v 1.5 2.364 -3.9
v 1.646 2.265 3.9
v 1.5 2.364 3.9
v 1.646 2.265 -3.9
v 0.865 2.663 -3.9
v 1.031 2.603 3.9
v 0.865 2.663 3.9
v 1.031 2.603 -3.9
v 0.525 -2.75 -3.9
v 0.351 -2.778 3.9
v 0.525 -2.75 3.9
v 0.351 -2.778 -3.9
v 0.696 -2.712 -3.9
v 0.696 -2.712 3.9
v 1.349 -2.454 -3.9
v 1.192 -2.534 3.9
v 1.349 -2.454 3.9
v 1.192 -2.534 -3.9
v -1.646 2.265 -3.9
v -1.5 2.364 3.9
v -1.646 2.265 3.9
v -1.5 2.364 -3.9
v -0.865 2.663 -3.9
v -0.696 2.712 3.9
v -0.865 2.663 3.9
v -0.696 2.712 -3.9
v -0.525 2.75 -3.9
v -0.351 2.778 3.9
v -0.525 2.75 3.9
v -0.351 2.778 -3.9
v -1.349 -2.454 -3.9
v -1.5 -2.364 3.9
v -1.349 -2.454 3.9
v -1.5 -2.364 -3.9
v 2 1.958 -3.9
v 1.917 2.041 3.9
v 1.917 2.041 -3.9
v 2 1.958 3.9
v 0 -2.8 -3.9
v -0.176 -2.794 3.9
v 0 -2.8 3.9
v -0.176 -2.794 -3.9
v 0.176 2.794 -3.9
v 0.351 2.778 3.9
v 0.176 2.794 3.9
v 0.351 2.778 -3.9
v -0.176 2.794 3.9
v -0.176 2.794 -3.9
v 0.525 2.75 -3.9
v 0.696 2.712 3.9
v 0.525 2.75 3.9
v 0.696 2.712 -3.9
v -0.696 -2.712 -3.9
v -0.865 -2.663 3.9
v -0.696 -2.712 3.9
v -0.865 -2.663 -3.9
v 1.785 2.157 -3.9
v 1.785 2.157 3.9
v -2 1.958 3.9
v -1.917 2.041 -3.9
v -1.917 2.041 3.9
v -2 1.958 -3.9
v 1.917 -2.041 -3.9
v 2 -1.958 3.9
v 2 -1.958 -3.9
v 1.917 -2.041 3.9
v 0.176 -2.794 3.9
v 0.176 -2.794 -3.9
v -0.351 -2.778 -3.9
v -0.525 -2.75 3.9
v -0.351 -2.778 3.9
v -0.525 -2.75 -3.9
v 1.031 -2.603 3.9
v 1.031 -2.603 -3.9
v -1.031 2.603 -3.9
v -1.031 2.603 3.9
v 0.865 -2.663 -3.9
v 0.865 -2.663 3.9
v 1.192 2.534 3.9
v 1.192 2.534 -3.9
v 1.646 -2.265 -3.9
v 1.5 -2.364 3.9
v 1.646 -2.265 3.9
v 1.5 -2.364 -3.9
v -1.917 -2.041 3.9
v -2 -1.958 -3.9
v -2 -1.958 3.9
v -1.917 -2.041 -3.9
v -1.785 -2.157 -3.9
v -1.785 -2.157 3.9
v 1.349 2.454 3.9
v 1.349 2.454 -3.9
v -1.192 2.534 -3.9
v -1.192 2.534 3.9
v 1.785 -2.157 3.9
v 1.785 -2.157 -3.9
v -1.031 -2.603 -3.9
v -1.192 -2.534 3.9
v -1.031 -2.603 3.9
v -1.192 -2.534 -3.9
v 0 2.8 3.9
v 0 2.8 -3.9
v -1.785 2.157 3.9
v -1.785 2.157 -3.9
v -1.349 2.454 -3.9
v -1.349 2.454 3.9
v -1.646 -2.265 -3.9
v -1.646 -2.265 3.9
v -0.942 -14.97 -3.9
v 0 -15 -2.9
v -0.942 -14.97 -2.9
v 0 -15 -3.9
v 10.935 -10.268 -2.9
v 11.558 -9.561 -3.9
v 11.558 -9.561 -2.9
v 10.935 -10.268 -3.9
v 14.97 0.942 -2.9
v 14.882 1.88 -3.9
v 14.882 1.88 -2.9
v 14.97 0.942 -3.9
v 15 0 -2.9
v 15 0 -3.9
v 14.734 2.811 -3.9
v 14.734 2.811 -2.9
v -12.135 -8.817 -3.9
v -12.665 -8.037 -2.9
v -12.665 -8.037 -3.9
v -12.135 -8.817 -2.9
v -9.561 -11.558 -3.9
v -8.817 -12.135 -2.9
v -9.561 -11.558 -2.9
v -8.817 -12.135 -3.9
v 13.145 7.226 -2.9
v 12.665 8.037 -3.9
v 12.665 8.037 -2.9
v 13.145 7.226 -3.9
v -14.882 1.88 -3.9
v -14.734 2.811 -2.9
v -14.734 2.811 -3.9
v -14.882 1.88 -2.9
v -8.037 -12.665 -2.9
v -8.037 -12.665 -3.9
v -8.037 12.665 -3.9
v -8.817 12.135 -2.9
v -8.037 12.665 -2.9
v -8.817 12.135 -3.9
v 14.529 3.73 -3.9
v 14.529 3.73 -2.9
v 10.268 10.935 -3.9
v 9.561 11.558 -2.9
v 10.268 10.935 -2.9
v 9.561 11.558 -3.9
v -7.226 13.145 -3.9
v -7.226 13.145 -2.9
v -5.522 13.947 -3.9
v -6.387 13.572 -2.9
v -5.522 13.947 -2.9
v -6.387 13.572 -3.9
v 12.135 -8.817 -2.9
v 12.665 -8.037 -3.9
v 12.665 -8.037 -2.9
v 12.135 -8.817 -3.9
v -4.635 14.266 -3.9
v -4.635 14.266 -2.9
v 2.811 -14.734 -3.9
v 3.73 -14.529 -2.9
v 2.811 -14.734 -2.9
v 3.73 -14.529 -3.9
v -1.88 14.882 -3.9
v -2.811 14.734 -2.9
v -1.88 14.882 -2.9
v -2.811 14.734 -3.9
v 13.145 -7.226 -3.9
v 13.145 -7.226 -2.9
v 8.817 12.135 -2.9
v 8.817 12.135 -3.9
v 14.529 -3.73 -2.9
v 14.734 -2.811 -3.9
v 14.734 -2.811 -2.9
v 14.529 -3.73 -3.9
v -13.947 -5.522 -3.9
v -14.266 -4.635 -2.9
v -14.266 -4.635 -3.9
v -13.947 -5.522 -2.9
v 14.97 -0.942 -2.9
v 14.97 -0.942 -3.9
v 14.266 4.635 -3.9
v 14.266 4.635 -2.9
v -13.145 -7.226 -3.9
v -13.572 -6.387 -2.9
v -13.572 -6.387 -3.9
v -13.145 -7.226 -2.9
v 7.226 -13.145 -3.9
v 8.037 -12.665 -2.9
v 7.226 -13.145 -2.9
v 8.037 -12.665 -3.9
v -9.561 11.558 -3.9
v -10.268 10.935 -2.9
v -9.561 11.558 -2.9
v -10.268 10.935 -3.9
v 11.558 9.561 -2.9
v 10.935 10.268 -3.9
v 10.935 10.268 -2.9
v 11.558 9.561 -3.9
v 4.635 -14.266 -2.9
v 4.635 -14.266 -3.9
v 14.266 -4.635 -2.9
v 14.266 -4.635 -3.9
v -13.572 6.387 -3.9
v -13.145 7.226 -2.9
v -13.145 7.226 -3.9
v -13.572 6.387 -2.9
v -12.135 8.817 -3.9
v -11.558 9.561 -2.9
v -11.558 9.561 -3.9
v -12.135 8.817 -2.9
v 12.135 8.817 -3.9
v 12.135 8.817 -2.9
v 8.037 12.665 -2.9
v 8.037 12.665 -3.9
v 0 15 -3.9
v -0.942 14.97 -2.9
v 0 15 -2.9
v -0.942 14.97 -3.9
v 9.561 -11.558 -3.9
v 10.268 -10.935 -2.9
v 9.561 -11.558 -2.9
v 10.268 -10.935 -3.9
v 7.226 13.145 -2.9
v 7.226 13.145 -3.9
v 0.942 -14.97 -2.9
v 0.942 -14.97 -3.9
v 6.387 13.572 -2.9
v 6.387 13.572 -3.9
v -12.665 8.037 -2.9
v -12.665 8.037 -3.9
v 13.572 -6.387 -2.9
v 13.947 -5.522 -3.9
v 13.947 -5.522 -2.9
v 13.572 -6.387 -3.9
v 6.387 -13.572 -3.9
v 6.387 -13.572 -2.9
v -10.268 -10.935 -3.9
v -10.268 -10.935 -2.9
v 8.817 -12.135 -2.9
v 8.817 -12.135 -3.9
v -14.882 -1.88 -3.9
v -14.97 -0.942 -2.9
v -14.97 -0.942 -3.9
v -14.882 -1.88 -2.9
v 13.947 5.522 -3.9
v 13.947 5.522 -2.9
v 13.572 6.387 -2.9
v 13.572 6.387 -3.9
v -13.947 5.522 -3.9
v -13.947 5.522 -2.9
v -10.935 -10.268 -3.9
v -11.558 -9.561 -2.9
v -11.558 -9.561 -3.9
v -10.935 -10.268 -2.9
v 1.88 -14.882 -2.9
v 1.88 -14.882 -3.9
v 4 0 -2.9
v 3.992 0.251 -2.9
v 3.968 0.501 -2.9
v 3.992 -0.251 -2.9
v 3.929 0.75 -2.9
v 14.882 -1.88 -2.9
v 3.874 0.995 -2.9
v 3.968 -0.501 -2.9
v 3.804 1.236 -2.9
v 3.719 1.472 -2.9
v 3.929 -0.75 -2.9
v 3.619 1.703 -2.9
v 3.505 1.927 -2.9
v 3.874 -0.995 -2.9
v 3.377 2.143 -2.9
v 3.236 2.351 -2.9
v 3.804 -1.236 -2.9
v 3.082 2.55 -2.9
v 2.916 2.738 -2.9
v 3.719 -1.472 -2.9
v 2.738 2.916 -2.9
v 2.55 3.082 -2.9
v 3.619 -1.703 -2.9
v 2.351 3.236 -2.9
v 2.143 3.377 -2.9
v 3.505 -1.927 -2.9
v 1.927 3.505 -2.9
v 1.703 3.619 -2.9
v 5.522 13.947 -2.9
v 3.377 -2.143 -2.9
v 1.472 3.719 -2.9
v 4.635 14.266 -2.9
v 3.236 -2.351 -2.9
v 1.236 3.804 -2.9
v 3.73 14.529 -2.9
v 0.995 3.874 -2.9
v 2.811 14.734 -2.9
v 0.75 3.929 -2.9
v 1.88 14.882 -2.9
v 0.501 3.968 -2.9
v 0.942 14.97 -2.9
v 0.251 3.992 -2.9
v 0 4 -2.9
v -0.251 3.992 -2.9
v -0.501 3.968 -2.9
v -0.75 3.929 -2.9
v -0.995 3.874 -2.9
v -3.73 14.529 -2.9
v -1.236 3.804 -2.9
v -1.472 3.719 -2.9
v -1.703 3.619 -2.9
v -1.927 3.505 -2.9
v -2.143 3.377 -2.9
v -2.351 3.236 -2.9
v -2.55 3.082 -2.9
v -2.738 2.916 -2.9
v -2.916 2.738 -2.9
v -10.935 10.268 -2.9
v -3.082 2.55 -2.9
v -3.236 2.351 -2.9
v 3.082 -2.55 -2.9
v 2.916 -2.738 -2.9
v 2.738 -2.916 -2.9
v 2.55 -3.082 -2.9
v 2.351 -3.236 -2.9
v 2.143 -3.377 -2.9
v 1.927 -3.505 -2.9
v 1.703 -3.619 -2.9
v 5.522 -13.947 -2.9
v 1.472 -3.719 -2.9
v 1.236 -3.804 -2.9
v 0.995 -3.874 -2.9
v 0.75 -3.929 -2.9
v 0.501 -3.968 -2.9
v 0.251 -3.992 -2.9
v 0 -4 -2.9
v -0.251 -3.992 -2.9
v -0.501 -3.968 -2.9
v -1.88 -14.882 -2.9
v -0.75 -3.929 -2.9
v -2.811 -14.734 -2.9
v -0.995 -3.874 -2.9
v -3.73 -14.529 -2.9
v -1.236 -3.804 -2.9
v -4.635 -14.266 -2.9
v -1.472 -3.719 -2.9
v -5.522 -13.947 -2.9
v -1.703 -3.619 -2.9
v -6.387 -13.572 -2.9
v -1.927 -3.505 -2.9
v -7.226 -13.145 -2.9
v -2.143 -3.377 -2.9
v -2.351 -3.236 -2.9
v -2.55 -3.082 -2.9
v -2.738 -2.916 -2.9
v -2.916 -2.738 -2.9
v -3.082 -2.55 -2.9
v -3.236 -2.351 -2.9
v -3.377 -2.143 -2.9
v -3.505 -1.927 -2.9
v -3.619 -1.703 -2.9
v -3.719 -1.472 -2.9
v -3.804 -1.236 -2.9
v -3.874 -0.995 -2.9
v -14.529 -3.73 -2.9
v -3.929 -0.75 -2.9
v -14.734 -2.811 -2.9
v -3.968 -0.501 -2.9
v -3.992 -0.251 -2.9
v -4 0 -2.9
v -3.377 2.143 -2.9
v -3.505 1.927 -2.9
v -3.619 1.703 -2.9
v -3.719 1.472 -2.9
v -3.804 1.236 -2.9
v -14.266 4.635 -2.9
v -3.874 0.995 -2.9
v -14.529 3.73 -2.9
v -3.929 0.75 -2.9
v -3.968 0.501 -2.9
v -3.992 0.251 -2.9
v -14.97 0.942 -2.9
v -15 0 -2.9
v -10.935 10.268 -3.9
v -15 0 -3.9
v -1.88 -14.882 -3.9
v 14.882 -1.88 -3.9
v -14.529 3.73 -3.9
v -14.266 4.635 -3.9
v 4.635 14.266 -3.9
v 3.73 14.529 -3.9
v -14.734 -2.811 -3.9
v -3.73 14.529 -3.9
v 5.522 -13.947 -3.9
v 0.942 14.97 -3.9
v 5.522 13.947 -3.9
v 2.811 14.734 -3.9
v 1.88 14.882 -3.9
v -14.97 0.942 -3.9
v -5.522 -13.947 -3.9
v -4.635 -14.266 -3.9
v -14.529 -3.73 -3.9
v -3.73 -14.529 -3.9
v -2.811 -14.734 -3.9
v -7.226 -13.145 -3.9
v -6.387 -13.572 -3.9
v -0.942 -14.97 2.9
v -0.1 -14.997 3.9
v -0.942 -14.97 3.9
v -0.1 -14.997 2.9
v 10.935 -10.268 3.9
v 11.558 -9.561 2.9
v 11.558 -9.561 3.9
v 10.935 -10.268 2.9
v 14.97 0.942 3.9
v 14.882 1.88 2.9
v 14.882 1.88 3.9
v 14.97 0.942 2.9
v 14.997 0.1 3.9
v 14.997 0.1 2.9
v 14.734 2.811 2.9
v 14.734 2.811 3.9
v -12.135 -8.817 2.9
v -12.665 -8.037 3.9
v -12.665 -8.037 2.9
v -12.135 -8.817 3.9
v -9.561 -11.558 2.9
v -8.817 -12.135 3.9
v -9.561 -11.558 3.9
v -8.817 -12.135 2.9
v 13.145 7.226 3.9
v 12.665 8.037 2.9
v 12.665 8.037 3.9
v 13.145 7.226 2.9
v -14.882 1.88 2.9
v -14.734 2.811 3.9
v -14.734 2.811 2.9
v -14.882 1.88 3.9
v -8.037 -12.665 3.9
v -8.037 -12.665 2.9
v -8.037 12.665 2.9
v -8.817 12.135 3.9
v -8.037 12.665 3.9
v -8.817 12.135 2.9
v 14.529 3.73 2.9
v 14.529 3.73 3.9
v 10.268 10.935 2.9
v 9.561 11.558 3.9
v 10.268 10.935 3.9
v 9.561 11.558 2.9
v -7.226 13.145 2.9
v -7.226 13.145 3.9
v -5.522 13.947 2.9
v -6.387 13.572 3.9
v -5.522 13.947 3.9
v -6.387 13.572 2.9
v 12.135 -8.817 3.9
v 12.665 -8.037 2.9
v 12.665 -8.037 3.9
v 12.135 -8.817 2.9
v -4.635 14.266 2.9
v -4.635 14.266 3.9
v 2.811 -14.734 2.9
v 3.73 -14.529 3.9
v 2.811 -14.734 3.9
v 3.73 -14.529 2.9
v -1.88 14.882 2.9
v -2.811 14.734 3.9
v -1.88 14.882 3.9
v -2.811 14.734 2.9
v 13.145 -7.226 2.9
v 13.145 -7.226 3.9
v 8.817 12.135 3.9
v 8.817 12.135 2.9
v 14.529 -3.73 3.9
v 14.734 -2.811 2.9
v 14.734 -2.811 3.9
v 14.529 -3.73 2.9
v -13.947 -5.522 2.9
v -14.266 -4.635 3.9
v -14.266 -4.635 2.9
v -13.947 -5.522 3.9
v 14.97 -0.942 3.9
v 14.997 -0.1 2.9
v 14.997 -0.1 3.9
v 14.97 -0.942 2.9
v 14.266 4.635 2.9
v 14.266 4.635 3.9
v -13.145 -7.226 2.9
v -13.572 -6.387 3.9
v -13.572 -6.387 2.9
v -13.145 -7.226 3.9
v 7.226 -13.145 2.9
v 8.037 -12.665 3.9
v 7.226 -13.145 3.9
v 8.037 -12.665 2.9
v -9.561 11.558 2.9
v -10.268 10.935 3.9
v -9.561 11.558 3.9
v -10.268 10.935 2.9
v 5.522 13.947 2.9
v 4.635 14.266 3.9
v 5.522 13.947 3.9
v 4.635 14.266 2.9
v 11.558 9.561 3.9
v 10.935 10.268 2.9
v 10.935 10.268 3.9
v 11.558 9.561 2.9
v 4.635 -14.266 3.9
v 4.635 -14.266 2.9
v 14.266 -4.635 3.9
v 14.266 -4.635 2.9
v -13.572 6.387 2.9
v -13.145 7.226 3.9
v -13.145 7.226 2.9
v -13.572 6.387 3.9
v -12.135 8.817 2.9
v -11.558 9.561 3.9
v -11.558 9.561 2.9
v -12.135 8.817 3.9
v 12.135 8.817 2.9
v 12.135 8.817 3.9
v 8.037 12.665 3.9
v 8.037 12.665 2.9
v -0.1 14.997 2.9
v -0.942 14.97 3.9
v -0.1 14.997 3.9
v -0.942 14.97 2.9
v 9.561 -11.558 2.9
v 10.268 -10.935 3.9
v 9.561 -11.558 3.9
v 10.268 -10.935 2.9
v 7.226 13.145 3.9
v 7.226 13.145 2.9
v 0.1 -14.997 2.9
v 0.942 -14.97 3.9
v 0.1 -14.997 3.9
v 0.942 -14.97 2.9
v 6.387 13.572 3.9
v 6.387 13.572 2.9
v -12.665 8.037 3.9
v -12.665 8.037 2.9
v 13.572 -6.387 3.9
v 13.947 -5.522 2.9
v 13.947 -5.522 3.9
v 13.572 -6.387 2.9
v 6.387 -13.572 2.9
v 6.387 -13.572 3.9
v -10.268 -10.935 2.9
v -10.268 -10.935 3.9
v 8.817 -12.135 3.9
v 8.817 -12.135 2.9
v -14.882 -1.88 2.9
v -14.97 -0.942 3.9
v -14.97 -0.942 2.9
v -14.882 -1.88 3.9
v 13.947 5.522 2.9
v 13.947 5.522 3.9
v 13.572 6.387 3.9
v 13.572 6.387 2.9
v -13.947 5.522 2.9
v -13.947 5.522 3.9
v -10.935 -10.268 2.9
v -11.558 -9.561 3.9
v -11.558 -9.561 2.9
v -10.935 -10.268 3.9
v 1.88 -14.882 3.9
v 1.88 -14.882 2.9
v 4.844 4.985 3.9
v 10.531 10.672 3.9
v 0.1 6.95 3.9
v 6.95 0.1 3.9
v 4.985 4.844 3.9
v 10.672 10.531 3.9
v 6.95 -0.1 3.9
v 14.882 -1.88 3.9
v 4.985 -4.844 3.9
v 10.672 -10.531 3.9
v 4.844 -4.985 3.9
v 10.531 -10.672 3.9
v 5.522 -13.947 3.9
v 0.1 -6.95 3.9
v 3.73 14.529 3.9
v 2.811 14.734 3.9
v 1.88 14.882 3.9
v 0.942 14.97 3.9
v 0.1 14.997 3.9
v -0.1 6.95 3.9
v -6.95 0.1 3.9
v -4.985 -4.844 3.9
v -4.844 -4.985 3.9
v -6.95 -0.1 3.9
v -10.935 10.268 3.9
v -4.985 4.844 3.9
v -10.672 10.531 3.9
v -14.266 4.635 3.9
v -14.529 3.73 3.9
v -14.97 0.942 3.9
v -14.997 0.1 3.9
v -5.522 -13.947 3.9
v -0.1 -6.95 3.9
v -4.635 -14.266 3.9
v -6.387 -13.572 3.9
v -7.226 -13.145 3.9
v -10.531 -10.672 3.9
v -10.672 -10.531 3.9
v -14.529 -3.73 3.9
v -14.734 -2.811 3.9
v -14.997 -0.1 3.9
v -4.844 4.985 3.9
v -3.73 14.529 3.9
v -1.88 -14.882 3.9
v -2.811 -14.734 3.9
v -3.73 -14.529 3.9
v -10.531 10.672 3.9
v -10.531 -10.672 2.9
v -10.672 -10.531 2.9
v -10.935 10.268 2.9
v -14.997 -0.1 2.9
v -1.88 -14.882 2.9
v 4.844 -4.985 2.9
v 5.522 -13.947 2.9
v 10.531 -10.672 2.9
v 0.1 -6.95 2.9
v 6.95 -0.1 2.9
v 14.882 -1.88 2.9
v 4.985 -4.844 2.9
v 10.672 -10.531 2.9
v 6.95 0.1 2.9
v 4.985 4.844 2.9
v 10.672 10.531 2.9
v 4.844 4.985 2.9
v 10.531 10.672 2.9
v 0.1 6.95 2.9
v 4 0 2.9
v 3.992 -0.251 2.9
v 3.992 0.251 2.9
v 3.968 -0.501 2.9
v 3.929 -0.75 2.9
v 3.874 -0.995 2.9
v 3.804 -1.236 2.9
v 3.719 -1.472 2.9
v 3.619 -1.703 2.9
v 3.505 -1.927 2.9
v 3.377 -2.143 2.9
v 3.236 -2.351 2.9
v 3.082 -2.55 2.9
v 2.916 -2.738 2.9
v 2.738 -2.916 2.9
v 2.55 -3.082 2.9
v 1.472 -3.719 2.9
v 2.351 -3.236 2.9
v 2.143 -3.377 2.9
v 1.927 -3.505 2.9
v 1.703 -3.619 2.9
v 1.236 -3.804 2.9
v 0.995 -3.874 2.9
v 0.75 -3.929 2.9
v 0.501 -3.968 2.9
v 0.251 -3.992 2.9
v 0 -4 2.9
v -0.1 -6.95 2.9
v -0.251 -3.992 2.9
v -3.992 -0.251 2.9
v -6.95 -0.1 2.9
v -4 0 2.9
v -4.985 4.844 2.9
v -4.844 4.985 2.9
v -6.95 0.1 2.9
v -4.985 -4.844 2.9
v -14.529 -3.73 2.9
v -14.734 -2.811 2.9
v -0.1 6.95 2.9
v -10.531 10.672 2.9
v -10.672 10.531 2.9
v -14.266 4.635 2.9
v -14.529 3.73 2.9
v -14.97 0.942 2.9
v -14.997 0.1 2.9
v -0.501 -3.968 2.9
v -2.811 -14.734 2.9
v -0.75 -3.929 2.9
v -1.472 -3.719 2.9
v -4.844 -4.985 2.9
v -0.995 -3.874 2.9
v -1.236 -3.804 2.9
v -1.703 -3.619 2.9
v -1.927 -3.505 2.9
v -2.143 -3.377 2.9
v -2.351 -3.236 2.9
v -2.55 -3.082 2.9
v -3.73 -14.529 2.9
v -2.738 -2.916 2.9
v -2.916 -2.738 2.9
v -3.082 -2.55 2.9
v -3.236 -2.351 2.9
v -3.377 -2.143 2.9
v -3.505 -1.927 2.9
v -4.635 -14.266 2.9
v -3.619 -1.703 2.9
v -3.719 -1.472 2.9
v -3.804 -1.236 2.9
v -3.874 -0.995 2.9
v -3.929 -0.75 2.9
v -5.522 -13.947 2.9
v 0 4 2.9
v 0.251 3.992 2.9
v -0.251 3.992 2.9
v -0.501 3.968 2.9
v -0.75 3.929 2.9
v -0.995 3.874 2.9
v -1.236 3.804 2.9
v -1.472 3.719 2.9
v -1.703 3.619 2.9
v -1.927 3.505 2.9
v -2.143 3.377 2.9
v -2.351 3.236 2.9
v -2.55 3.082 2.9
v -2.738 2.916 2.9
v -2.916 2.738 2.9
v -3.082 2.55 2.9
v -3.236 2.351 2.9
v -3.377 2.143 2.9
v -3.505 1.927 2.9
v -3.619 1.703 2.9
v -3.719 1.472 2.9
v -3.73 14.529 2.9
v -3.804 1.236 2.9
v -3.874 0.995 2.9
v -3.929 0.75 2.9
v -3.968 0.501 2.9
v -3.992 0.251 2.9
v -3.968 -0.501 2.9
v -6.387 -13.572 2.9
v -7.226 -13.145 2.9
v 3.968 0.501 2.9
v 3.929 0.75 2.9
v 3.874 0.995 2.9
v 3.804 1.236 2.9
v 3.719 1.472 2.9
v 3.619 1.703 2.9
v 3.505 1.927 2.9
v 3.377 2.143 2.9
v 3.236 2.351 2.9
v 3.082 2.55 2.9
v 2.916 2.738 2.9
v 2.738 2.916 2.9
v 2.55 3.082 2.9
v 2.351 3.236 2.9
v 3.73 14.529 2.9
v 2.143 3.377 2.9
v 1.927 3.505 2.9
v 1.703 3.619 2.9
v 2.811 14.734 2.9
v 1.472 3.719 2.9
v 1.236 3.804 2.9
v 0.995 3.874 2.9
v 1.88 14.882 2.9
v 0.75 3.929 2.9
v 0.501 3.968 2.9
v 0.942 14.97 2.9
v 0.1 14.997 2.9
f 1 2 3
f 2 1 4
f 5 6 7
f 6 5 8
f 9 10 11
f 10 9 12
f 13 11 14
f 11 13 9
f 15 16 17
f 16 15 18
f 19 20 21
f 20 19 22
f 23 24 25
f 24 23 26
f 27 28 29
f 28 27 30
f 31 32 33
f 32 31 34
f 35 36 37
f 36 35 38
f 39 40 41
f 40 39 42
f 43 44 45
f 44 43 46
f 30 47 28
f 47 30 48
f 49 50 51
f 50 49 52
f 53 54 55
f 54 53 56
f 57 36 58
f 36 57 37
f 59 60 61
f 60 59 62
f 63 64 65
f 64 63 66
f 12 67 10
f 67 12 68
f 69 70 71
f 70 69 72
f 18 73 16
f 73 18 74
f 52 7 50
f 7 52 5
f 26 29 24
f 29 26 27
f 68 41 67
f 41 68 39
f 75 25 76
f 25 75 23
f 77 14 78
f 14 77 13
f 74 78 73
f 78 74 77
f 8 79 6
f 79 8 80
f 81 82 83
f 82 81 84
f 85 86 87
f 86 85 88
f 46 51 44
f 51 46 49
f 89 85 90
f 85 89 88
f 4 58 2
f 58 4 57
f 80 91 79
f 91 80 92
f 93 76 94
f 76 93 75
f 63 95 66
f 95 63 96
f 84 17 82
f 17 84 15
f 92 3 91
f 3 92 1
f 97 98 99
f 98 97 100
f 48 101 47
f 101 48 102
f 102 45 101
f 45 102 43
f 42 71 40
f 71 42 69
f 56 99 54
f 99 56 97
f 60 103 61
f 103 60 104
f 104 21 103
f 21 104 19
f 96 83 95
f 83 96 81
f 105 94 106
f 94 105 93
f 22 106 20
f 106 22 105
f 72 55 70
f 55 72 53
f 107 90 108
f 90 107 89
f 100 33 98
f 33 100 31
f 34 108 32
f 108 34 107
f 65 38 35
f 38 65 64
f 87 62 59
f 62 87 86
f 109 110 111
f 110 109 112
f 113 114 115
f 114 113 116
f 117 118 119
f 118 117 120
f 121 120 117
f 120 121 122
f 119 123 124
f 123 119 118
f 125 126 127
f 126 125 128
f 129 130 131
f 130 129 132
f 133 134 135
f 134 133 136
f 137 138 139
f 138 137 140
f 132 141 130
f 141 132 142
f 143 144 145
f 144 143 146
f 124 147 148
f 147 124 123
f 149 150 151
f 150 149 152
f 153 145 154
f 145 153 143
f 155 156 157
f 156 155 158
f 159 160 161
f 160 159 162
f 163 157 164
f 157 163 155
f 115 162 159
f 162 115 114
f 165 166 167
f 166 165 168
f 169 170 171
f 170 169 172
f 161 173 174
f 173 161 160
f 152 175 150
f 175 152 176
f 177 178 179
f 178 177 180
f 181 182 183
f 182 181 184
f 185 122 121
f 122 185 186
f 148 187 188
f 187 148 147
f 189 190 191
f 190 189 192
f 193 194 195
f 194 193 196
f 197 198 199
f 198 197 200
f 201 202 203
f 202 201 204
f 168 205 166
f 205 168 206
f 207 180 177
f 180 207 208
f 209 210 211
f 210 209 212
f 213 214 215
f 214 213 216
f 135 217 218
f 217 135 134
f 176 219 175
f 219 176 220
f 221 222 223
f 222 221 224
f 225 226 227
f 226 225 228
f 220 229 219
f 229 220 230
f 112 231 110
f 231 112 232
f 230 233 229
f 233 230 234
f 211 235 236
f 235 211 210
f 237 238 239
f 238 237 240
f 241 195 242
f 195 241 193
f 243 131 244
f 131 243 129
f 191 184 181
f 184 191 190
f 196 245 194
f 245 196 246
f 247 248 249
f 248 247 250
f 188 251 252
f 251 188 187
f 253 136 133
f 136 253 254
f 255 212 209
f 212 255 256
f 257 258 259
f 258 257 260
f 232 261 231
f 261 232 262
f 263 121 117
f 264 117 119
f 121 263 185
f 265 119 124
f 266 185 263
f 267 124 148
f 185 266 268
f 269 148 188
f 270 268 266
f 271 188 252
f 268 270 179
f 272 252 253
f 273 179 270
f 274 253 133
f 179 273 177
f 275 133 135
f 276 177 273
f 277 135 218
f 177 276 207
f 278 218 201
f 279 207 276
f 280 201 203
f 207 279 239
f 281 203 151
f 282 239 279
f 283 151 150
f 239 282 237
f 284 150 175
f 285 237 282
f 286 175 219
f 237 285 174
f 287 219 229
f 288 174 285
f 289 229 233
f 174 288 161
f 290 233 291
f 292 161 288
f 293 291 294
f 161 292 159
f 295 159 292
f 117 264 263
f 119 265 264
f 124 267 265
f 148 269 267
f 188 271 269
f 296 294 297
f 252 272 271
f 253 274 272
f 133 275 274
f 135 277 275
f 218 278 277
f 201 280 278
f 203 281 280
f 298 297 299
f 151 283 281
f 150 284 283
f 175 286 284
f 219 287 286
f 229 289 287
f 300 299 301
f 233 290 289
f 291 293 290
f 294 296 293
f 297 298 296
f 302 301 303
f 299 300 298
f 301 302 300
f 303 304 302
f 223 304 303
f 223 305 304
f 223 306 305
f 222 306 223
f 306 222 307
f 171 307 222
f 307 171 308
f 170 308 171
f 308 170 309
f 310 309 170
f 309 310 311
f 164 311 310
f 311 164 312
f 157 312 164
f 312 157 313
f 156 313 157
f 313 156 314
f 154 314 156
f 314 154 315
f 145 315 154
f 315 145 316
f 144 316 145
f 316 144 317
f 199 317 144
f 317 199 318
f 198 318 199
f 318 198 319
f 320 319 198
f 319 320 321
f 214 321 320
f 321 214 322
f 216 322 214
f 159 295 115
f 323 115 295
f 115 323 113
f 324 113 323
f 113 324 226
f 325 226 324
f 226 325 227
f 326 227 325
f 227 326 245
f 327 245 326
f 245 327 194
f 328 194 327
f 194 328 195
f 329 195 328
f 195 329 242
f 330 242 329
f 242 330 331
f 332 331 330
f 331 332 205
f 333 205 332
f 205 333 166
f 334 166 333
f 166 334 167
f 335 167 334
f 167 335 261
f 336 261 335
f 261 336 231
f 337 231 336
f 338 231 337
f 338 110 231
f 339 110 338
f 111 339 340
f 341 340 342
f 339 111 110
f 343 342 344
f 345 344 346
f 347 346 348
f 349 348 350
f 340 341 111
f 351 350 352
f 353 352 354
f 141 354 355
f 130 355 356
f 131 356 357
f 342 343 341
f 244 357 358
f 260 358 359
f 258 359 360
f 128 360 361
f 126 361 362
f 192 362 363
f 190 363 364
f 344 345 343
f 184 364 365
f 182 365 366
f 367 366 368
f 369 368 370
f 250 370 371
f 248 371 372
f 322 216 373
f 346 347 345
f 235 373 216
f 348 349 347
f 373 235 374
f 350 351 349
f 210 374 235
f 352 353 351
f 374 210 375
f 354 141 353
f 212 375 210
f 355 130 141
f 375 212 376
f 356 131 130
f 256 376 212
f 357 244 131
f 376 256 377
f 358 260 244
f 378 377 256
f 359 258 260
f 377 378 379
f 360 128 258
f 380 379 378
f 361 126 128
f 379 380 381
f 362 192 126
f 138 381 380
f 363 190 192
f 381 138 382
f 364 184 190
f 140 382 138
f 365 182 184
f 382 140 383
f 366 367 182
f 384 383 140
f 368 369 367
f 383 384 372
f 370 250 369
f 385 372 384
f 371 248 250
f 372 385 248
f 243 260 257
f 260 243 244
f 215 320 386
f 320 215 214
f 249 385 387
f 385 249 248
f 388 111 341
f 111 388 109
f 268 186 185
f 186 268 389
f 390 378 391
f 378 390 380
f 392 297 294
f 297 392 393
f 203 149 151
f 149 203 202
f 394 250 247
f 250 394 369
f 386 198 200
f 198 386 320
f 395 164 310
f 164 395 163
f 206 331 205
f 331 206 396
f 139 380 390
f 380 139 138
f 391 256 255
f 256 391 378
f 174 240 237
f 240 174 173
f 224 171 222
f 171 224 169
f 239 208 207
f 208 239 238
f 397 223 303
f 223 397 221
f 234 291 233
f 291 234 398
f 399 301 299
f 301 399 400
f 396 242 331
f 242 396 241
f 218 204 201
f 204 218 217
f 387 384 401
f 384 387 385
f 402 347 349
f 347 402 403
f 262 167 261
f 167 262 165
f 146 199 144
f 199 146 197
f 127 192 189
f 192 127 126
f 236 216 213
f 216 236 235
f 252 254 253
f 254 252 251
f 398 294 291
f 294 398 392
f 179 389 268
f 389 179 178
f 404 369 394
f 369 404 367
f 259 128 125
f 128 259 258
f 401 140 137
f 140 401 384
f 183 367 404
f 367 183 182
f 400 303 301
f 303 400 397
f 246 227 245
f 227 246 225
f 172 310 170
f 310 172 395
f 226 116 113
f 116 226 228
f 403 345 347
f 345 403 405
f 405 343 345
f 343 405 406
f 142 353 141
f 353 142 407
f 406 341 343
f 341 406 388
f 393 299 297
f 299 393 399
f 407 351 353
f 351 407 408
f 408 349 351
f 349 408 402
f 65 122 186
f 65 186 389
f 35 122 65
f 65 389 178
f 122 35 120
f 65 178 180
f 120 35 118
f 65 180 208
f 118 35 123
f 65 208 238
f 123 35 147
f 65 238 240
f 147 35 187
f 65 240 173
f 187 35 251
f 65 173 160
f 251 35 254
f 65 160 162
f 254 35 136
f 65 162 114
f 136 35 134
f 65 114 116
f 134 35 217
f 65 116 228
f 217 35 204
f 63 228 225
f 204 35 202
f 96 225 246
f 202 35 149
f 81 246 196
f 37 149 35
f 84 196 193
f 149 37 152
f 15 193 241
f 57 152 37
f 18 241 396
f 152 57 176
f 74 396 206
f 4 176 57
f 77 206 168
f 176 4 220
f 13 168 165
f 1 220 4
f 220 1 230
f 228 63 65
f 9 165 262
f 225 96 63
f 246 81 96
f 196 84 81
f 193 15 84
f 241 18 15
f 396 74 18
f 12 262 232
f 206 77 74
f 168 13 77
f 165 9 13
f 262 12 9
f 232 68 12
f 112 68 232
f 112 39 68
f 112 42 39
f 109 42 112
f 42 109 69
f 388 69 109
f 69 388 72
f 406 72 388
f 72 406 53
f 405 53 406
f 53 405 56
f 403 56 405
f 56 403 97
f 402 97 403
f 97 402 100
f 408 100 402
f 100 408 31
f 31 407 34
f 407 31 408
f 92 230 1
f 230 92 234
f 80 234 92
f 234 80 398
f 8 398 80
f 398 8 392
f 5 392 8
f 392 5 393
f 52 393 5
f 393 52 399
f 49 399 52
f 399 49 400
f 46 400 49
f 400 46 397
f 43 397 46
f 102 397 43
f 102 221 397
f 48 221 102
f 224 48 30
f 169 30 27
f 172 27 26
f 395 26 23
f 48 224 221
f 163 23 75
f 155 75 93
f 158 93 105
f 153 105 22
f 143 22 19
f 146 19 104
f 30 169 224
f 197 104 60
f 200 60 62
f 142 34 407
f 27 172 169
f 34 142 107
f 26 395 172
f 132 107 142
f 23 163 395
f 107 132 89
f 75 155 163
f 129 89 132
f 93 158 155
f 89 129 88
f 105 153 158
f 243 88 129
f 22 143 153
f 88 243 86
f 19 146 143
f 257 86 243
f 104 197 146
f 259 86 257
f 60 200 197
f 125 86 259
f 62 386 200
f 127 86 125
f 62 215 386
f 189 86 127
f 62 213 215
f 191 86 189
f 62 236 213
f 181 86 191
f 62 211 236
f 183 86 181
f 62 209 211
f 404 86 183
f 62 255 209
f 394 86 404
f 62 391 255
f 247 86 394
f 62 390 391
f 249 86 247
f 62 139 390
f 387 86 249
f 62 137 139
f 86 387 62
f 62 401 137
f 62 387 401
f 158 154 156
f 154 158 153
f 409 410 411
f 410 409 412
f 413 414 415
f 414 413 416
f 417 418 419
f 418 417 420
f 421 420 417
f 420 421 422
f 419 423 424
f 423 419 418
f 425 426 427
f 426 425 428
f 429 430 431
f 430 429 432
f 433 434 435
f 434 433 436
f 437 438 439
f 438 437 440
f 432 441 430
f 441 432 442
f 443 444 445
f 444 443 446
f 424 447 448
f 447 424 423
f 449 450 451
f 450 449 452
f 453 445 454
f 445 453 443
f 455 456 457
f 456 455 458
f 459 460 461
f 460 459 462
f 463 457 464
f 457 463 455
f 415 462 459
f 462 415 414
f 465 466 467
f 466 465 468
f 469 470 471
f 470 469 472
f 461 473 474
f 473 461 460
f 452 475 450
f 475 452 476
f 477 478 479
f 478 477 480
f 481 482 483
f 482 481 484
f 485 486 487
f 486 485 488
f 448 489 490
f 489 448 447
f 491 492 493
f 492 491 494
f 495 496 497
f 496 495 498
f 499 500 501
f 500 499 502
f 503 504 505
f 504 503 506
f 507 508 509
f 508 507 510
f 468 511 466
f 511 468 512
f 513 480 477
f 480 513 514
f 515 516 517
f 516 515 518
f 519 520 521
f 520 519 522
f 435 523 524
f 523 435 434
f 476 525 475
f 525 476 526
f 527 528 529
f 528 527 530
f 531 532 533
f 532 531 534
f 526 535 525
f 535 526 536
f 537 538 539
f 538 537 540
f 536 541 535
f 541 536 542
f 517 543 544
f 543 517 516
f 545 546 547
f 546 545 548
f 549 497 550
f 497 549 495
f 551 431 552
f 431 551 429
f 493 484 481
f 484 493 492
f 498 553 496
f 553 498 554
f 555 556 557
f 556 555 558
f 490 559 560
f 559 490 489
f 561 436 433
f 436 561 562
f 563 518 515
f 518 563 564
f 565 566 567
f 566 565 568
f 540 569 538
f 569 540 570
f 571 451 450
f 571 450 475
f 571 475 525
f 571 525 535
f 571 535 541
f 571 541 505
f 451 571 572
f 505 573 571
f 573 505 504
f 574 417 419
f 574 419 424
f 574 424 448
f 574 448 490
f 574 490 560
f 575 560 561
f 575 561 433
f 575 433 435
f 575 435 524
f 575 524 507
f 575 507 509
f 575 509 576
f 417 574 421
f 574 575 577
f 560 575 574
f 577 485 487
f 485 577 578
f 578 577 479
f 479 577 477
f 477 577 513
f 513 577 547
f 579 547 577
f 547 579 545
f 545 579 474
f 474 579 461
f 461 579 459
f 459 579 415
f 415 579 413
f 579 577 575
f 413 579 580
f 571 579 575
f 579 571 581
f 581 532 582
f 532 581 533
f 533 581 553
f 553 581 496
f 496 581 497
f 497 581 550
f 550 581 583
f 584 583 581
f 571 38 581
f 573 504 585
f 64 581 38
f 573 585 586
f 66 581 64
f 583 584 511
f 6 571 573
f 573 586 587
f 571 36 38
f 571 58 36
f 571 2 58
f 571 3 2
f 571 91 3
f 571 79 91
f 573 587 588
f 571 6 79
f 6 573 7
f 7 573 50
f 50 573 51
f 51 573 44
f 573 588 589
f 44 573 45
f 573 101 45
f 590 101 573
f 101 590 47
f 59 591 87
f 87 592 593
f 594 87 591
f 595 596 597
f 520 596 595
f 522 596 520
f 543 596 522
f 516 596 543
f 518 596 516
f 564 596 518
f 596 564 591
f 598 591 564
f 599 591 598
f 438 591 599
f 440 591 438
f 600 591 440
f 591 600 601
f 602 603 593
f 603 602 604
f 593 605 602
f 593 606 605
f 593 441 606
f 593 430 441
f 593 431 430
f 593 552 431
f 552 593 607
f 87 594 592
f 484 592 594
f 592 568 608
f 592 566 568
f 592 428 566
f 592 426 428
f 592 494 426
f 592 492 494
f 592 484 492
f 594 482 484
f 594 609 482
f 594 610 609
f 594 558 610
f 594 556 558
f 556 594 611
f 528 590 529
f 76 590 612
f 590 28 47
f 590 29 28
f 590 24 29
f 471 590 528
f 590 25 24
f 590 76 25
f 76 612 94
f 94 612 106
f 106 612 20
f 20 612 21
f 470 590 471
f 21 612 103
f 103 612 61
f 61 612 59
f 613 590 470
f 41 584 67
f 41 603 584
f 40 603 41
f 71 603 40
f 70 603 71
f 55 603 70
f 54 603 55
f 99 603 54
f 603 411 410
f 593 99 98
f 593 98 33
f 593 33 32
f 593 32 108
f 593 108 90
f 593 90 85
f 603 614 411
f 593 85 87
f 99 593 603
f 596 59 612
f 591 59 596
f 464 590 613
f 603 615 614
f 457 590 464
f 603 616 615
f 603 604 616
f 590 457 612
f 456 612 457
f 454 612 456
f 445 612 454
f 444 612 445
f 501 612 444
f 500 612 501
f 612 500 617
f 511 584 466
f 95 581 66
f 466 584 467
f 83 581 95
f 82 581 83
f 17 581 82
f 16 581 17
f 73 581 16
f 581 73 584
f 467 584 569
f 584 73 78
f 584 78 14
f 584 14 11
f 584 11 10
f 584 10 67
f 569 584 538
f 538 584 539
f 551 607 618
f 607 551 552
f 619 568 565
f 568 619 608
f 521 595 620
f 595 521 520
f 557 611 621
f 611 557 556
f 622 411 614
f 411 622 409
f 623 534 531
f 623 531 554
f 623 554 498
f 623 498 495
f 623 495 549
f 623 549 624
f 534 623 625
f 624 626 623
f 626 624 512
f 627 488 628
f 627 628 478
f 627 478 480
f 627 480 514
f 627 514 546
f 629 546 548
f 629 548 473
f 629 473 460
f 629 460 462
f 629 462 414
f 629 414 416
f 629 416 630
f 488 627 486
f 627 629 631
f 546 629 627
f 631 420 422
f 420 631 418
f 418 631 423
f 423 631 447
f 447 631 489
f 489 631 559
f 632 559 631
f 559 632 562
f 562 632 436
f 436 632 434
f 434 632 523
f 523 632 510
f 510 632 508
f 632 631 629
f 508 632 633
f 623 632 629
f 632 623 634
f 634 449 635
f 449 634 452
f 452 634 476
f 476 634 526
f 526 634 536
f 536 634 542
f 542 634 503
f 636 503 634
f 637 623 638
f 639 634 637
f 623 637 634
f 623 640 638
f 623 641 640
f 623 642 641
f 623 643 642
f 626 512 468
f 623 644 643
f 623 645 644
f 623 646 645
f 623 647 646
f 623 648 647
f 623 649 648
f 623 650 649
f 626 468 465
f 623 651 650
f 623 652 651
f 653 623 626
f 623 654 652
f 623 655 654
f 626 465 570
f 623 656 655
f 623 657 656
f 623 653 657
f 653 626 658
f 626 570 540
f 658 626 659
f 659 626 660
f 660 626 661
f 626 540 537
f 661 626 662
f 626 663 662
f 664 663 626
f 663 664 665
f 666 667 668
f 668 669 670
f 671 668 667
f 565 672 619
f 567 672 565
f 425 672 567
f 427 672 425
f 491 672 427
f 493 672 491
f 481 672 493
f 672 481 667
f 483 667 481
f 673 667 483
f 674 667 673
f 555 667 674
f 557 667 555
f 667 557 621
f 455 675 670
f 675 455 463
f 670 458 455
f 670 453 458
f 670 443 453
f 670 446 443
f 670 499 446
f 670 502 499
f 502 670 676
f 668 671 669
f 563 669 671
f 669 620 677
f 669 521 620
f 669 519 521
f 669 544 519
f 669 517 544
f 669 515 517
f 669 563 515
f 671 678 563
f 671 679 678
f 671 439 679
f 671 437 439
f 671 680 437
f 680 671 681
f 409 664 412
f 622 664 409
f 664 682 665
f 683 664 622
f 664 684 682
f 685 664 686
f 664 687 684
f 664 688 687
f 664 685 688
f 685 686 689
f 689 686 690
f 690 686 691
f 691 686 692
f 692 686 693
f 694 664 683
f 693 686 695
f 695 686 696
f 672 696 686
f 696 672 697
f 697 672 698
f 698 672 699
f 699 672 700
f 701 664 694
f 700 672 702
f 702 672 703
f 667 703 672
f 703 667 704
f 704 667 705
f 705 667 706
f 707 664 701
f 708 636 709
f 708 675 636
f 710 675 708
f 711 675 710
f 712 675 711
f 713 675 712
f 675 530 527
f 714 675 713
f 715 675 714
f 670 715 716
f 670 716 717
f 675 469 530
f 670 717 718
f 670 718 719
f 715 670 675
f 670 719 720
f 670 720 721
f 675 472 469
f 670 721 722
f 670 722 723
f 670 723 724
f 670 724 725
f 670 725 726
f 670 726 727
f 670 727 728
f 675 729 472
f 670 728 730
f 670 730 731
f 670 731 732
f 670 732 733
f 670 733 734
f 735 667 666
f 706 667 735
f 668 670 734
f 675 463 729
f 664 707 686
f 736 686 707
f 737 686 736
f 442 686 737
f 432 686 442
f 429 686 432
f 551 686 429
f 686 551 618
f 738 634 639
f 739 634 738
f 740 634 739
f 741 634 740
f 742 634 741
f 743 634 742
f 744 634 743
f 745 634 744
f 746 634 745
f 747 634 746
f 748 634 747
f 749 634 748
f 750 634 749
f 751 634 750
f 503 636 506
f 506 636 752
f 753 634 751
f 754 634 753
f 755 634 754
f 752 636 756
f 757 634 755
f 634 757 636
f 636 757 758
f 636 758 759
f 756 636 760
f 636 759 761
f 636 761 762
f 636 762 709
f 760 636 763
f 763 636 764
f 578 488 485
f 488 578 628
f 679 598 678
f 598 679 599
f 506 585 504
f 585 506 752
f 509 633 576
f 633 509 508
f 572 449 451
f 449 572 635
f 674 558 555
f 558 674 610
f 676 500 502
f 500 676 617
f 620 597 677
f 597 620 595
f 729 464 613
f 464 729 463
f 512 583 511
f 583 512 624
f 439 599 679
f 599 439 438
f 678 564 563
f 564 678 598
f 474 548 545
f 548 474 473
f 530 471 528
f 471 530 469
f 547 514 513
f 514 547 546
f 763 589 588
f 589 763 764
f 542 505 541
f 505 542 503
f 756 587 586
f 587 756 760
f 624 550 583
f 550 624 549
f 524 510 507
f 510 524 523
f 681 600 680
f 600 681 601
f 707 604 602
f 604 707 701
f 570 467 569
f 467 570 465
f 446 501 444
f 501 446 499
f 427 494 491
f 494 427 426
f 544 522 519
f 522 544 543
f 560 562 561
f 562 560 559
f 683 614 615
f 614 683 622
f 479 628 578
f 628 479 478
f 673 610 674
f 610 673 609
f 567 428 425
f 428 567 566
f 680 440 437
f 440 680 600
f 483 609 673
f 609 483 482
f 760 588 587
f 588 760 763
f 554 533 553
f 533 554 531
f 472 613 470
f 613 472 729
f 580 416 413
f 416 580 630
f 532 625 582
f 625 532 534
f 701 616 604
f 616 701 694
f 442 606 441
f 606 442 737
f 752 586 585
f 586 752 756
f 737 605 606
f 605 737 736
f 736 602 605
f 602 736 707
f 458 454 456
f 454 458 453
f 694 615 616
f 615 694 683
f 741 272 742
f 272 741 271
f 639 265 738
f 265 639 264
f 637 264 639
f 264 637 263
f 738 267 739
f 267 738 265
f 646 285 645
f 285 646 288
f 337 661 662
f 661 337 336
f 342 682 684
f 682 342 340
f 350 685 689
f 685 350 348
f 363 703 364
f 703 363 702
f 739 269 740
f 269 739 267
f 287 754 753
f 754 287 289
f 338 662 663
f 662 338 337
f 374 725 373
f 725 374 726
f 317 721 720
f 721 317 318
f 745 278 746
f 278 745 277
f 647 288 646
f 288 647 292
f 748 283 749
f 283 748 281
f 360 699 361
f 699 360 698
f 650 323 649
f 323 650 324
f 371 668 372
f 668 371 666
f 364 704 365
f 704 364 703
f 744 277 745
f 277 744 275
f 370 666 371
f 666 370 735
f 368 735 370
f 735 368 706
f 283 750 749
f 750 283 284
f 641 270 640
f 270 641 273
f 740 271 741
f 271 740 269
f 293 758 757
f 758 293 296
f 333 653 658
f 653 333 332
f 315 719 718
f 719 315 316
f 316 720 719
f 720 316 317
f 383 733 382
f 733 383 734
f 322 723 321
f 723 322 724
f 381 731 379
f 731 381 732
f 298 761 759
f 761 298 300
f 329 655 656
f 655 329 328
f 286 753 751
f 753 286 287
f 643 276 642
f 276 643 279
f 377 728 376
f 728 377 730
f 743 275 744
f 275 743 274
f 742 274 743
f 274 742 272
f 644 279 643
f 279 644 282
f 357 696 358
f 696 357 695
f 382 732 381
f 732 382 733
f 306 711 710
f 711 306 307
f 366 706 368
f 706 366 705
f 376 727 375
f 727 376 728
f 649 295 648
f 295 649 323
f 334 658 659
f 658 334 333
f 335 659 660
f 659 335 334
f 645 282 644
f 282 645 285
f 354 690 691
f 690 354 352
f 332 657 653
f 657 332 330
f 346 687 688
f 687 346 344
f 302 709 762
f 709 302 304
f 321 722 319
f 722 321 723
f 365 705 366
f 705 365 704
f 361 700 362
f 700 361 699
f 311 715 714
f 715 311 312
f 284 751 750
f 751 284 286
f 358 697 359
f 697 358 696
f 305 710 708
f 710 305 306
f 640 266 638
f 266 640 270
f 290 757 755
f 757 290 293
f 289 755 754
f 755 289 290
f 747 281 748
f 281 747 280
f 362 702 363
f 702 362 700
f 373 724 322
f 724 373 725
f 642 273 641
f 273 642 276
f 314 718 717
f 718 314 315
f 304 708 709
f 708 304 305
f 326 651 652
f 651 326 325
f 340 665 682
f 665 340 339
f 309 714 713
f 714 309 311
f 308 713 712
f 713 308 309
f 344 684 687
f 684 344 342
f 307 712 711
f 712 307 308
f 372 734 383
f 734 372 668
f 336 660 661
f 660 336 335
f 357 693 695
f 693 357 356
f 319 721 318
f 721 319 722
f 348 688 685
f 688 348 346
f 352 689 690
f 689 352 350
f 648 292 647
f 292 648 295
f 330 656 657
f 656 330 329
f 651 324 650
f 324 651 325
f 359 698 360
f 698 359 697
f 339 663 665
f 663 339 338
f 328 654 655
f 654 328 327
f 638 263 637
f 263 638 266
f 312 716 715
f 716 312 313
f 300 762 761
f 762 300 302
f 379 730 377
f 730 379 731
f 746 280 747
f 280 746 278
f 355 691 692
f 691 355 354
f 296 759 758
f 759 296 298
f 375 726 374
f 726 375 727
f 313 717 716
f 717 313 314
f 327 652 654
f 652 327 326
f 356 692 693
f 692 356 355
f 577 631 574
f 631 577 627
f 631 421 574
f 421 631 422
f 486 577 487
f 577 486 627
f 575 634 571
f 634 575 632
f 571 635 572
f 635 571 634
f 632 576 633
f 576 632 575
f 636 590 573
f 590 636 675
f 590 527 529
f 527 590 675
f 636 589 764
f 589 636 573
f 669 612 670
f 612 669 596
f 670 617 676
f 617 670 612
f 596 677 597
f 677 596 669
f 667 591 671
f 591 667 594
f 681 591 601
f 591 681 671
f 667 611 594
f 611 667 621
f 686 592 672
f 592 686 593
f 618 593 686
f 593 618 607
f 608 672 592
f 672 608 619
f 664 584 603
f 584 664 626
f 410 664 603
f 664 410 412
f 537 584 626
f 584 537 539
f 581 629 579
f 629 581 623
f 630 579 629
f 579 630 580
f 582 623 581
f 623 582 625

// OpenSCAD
$fn=100;
cr=5.6/2;     // core radius
it=4.0;        // inside thickness
tr=4;
or=15;    // outside radius
tw=5.8;     // tape width
ww=1.0;       // wall width

cw = tw+ww;

module top(){
difference(){
union(){
translate([0,0,-(tw+ww)/2])
cylinder(r=or,h=ww,center=true);
}

difference(){
cylinder(r=cr,h=cw+2,center=true);

translate([it/2+2,0,0])
cube([4,10,10],center=true);
translate([-it/2-2,0,0])
cube([4,10,10],center=true);
}
}
}

module bottom(){
difference(){
union(){
translate([0,0,(tw+ww)/2])
cylinder(r=or,h=ww,center=true);

cylinder(r=tr,h=cw,center=true);
}

difference(){
cylinder(r=cr,h=cw+2,center=true);

translate([it/2+2,0,0])
cube([4,10,10],center=true);
translate([-it/2-2,0,0])
cube([4,10,10],center=true);
}

xr=tr+3;
for (i = [0 : 7])
rotate([0,0,360 * i / 8])
translate([xr+(or-xr)/2,0,(tw+ww)/2])
cube([(or-xr)+0.1,0.2,ww+1],center=true);
}
}

top();
bottom();
